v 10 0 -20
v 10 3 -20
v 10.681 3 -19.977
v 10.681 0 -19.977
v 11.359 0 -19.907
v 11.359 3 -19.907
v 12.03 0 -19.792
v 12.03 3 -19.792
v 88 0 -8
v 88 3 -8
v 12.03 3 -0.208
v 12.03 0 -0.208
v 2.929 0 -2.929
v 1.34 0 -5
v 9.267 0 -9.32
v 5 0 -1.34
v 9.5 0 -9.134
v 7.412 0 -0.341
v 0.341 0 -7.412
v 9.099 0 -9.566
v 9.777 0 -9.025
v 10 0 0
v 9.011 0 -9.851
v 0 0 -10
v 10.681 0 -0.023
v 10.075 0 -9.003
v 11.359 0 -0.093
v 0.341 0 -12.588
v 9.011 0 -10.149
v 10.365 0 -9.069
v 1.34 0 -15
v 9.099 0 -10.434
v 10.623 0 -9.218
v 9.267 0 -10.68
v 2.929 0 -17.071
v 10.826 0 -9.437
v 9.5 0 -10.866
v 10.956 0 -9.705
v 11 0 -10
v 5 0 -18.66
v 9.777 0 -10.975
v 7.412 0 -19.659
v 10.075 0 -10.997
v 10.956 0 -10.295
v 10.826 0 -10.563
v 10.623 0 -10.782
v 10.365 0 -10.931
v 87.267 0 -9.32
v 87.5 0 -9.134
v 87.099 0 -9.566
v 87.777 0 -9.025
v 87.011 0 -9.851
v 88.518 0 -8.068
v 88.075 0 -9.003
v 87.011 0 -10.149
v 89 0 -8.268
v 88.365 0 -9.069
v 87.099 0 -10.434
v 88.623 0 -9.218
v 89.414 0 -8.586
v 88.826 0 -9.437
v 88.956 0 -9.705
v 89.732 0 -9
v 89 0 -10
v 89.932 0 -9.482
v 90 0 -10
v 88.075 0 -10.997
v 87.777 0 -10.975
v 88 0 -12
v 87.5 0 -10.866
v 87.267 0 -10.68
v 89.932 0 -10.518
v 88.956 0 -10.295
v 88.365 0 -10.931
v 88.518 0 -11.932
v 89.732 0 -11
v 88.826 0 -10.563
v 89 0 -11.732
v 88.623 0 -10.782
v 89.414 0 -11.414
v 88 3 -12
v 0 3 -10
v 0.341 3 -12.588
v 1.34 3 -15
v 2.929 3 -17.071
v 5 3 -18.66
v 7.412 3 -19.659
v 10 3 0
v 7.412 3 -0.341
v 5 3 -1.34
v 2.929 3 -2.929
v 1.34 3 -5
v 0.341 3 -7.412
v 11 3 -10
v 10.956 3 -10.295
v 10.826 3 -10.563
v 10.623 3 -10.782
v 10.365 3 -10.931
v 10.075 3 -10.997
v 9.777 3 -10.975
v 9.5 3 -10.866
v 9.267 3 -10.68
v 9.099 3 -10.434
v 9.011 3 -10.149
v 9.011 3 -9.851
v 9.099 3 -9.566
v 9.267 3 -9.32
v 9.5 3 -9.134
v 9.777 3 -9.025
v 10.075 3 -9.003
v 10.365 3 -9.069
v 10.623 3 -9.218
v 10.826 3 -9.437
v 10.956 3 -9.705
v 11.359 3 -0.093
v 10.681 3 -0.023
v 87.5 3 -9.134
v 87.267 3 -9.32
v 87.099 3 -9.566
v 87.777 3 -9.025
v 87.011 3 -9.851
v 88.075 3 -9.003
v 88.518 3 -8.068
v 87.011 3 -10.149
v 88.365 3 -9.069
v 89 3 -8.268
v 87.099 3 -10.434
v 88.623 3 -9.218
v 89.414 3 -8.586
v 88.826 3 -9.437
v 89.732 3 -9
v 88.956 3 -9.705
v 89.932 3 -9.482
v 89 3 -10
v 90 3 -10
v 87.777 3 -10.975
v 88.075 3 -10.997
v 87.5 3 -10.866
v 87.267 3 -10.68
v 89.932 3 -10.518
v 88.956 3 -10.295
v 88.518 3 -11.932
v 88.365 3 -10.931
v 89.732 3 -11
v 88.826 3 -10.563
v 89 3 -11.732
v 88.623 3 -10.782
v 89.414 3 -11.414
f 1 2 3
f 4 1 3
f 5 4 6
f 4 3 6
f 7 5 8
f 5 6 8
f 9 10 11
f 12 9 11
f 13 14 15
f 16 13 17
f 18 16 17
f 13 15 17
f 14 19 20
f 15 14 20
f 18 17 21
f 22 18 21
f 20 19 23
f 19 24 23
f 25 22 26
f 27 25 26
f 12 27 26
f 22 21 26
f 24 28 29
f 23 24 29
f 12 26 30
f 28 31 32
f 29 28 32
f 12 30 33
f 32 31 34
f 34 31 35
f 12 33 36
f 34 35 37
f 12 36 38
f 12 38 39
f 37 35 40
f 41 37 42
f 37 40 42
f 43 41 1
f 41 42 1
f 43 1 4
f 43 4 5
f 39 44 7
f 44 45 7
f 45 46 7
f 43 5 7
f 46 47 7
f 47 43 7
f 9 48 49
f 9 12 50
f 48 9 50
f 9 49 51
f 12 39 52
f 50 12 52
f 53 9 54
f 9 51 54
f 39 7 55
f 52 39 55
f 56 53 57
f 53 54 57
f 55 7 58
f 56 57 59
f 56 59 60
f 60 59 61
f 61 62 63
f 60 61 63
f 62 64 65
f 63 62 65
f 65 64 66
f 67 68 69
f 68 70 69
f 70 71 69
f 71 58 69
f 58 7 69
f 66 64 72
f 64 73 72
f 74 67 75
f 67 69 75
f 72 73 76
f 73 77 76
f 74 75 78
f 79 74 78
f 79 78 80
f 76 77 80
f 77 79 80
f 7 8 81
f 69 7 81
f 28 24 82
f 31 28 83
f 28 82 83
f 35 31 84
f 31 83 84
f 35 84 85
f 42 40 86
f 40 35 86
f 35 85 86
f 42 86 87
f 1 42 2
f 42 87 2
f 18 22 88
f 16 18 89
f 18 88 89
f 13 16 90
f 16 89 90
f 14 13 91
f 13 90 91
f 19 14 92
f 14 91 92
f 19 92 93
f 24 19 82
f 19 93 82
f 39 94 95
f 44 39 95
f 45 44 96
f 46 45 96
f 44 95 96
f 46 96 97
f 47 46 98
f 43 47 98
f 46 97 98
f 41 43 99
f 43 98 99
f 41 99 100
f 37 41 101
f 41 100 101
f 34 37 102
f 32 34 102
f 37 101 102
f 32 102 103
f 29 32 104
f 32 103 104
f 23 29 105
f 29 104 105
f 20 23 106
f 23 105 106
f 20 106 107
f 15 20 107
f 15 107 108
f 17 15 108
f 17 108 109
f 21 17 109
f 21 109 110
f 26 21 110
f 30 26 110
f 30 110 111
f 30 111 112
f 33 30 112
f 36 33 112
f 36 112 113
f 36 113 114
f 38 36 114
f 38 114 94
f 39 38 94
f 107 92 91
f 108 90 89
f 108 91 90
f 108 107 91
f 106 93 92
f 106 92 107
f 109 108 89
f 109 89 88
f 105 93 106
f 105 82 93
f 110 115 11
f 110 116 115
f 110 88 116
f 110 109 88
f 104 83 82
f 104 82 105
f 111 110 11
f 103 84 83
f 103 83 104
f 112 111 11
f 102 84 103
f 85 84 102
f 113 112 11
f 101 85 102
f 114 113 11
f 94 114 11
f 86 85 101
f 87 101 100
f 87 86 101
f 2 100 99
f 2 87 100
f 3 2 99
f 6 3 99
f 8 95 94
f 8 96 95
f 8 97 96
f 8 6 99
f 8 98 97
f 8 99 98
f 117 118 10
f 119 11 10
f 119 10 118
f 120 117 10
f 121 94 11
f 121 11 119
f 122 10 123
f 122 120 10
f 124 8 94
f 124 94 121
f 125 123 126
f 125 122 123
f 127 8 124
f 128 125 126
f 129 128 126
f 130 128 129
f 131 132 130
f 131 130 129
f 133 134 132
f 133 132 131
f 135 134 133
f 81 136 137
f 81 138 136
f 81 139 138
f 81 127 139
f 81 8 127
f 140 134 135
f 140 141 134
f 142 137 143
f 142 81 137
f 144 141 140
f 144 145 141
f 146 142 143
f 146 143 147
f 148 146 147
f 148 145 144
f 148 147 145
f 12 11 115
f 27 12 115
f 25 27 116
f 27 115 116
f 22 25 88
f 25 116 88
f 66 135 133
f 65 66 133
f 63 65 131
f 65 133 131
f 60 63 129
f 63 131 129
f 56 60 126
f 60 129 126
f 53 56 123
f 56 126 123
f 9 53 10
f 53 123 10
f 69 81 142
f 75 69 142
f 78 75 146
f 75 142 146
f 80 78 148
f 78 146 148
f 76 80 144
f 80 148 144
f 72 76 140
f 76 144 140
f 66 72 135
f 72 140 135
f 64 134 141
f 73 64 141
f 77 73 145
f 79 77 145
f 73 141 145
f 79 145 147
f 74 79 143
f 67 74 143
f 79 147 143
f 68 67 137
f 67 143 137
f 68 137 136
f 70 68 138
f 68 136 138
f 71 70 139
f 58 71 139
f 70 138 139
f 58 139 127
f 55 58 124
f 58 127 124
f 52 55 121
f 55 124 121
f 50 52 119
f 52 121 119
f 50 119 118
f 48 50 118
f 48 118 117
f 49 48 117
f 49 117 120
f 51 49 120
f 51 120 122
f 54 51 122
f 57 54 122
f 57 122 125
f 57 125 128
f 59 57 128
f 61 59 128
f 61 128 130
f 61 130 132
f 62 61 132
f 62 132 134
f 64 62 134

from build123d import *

# Parameters (mm, degrees)
SKETCH1_W           = 90
SKETCH1_H           = 20
BOSS_EXTRUDE1_DEPTH = 3
CUT_EXTRUDE1_DEPTH  = 4
SKETCH3_R           = 1
CUT_EXTRUDE2_DEPTH  = 4


with BuildPart() as part:
    # Sketch1 → Boss-Extrude1 (new body)
    with BuildSketch(Plane(origin=(0, 0, 0), x_dir=(1, 0, 0), z_dir=(0, 1, 0))):
        with Locations((45, 10)):
            Rectangle(SKETCH1_W, SKETCH1_H)
    extrude(amount=BOSS_EXTRUDE1_DEPTH)

    # Sketch2 → Cut-Extrude1 (cut, through all)
    with BuildSketch(Plane(origin=(0, 3, 0), x_dir=(1, 0, 0), z_dir=(0, 1, 0))):
        with BuildLine():
            Line((90, 20), (10, 20))
            ThreePointArc((10, 20), (11.020288655, 19.947814386), (12.029928432, 19.791802212))
            Line((12.029928432, 19.791802212), (88, 12))
            ThreePointArc((88, 12), (89.414213562, 11.414213562), (90, 10))
            Line((90, 10), (90, 20))
        make_face()
        with BuildLine():
            Line((90, 0), (90, 10))
            ThreePointArc((90, 10), (89.414213562, 8.585786438), (88, 8))
            Line((88, 8), (12.029928432, 0.208197788))
            ThreePointArc((12.029928432, 0.208197788), (11.020288655, 0.052185614), (10, 0))
            Line((10, 0), (90, 0))
        make_face()
        with BuildLine():
            ThreePointArc((10, 0), (2.928932188, 2.928932188), (0, 10))
            Line((0, 10), (0, 0))
            Line((0, 0), (10, 0))
        make_face()
        with BuildLine():
            ThreePointArc((0, 10), (2.928932188, 17.071067812), (10, 20))
            Line((10, 20), (0, 20))
            Line((0, 20), (0, 10))
        make_face()
    extrude(amount=-CUT_EXTRUDE1_DEPTH, mode=Mode.SUBTRACT)

    # Sketch3 → Cut-Extrude2 (cut, through all)
    with BuildSketch(Plane(origin=(0, 3, 0), x_dir=(1, 0, 0), z_dir=(0, 1, 0))):
        with Locations((10, 10)):
            Circle(SKETCH3_R)
        with Locations((88, 10)):
            Circle(SKETCH3_R)
    extrude(amount=-CUT_EXTRUDE2_DEPTH, mode=Mode.SUBTRACT)


solid = part.part
